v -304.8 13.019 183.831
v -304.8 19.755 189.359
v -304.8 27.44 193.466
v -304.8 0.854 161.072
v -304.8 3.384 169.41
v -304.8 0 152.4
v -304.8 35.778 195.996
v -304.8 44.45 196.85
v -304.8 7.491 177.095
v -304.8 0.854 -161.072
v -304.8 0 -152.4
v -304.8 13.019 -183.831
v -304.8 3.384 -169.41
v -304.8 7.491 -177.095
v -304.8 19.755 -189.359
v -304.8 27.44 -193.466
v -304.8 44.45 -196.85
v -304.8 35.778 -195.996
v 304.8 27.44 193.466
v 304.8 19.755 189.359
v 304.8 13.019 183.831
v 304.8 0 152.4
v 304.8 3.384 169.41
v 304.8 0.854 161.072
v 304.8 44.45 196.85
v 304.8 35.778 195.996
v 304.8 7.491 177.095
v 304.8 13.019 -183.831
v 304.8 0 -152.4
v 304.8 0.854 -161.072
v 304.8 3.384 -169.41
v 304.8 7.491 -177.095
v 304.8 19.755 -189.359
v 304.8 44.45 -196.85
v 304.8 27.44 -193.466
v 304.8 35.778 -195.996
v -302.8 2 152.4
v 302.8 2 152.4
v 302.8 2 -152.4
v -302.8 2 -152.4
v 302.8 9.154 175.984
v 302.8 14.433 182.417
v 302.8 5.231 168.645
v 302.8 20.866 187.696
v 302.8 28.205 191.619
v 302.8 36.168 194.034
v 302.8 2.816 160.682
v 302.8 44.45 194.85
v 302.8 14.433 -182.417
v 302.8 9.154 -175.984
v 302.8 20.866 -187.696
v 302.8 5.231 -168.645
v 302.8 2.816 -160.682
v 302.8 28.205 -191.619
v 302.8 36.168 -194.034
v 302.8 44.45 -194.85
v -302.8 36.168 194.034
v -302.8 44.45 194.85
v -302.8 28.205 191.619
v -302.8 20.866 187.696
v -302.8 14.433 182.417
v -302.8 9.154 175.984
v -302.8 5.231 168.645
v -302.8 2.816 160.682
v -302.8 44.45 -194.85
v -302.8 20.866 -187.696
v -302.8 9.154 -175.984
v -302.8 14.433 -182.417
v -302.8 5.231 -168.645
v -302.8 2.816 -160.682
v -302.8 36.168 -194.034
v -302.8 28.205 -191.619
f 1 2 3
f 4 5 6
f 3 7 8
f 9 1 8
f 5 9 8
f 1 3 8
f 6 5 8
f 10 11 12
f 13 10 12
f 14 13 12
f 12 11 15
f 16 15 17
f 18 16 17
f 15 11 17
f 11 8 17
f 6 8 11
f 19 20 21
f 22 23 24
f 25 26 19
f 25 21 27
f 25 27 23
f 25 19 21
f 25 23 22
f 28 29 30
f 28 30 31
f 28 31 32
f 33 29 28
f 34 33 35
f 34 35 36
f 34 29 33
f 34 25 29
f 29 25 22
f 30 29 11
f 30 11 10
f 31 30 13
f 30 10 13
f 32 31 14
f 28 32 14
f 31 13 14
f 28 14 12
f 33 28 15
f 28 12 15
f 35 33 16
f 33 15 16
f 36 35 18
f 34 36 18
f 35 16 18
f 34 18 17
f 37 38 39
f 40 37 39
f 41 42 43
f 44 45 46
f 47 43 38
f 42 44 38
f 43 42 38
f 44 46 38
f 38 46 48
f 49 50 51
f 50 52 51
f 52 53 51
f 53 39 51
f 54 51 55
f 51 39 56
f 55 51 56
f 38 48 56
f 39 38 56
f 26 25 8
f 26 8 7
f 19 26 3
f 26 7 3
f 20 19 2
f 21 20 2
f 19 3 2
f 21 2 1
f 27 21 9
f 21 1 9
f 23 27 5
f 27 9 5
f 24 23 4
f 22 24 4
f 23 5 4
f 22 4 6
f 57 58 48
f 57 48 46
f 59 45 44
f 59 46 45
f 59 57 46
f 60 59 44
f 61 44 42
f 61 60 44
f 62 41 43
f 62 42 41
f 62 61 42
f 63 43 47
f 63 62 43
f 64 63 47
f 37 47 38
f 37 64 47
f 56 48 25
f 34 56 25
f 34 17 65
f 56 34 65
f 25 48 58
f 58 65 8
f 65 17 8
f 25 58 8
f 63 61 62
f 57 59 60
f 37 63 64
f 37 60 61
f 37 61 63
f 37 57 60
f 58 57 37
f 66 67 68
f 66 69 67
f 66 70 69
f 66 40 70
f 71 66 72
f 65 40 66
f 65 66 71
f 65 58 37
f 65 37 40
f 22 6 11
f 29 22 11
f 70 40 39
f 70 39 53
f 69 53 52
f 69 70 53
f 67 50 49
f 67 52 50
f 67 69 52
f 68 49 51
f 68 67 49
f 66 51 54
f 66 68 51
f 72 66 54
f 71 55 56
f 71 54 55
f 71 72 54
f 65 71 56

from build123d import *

# Parameters (mm, degrees)
COVERBASEEXTRUDE_DEPTH      = 304.8
COVERBASEEXTRUDE_DEPTH_BACK = 304.8
COVERSHELL_T                = -2


with BuildPart() as part:
    # Sketch1 → CoverBaseExtrude (new, two sides: drawn at the far end of the back side and taken through both)
    with BuildSketch(Plane(origin=(0, 0, 0), x_dir=(0, 0, -1), z_dir=(1, 0, 0)).offset(-COVERBASEEXTRUDE_DEPTH_BACK)):
        with BuildLine():
            Line((-152.4, 0), (152.4, 0))
            ThreePointArc((152.4, 0), (183.830896424, 13.019103576), (196.85, 44.45))
            Line((196.85, 44.45), (-196.85, 44.45))
            ThreePointArc((-196.85, 44.45), (-183.830896424, 13.019103576), (-152.4, 0))
        make_face()
    extrude(amount=COVERBASEEXTRUDE_DEPTH + COVERBASEEXTRUDE_DEPTH_BACK)

    # CoverShell
    covershell_openings = [part.faces().sort_by_distance(p)[0] for p in [
        (0, 44.45, 0),
    ]]
    offset(amount=COVERSHELL_T, openings=covershell_openings, kind=Kind.INTERSECTION)


solid = part.part
